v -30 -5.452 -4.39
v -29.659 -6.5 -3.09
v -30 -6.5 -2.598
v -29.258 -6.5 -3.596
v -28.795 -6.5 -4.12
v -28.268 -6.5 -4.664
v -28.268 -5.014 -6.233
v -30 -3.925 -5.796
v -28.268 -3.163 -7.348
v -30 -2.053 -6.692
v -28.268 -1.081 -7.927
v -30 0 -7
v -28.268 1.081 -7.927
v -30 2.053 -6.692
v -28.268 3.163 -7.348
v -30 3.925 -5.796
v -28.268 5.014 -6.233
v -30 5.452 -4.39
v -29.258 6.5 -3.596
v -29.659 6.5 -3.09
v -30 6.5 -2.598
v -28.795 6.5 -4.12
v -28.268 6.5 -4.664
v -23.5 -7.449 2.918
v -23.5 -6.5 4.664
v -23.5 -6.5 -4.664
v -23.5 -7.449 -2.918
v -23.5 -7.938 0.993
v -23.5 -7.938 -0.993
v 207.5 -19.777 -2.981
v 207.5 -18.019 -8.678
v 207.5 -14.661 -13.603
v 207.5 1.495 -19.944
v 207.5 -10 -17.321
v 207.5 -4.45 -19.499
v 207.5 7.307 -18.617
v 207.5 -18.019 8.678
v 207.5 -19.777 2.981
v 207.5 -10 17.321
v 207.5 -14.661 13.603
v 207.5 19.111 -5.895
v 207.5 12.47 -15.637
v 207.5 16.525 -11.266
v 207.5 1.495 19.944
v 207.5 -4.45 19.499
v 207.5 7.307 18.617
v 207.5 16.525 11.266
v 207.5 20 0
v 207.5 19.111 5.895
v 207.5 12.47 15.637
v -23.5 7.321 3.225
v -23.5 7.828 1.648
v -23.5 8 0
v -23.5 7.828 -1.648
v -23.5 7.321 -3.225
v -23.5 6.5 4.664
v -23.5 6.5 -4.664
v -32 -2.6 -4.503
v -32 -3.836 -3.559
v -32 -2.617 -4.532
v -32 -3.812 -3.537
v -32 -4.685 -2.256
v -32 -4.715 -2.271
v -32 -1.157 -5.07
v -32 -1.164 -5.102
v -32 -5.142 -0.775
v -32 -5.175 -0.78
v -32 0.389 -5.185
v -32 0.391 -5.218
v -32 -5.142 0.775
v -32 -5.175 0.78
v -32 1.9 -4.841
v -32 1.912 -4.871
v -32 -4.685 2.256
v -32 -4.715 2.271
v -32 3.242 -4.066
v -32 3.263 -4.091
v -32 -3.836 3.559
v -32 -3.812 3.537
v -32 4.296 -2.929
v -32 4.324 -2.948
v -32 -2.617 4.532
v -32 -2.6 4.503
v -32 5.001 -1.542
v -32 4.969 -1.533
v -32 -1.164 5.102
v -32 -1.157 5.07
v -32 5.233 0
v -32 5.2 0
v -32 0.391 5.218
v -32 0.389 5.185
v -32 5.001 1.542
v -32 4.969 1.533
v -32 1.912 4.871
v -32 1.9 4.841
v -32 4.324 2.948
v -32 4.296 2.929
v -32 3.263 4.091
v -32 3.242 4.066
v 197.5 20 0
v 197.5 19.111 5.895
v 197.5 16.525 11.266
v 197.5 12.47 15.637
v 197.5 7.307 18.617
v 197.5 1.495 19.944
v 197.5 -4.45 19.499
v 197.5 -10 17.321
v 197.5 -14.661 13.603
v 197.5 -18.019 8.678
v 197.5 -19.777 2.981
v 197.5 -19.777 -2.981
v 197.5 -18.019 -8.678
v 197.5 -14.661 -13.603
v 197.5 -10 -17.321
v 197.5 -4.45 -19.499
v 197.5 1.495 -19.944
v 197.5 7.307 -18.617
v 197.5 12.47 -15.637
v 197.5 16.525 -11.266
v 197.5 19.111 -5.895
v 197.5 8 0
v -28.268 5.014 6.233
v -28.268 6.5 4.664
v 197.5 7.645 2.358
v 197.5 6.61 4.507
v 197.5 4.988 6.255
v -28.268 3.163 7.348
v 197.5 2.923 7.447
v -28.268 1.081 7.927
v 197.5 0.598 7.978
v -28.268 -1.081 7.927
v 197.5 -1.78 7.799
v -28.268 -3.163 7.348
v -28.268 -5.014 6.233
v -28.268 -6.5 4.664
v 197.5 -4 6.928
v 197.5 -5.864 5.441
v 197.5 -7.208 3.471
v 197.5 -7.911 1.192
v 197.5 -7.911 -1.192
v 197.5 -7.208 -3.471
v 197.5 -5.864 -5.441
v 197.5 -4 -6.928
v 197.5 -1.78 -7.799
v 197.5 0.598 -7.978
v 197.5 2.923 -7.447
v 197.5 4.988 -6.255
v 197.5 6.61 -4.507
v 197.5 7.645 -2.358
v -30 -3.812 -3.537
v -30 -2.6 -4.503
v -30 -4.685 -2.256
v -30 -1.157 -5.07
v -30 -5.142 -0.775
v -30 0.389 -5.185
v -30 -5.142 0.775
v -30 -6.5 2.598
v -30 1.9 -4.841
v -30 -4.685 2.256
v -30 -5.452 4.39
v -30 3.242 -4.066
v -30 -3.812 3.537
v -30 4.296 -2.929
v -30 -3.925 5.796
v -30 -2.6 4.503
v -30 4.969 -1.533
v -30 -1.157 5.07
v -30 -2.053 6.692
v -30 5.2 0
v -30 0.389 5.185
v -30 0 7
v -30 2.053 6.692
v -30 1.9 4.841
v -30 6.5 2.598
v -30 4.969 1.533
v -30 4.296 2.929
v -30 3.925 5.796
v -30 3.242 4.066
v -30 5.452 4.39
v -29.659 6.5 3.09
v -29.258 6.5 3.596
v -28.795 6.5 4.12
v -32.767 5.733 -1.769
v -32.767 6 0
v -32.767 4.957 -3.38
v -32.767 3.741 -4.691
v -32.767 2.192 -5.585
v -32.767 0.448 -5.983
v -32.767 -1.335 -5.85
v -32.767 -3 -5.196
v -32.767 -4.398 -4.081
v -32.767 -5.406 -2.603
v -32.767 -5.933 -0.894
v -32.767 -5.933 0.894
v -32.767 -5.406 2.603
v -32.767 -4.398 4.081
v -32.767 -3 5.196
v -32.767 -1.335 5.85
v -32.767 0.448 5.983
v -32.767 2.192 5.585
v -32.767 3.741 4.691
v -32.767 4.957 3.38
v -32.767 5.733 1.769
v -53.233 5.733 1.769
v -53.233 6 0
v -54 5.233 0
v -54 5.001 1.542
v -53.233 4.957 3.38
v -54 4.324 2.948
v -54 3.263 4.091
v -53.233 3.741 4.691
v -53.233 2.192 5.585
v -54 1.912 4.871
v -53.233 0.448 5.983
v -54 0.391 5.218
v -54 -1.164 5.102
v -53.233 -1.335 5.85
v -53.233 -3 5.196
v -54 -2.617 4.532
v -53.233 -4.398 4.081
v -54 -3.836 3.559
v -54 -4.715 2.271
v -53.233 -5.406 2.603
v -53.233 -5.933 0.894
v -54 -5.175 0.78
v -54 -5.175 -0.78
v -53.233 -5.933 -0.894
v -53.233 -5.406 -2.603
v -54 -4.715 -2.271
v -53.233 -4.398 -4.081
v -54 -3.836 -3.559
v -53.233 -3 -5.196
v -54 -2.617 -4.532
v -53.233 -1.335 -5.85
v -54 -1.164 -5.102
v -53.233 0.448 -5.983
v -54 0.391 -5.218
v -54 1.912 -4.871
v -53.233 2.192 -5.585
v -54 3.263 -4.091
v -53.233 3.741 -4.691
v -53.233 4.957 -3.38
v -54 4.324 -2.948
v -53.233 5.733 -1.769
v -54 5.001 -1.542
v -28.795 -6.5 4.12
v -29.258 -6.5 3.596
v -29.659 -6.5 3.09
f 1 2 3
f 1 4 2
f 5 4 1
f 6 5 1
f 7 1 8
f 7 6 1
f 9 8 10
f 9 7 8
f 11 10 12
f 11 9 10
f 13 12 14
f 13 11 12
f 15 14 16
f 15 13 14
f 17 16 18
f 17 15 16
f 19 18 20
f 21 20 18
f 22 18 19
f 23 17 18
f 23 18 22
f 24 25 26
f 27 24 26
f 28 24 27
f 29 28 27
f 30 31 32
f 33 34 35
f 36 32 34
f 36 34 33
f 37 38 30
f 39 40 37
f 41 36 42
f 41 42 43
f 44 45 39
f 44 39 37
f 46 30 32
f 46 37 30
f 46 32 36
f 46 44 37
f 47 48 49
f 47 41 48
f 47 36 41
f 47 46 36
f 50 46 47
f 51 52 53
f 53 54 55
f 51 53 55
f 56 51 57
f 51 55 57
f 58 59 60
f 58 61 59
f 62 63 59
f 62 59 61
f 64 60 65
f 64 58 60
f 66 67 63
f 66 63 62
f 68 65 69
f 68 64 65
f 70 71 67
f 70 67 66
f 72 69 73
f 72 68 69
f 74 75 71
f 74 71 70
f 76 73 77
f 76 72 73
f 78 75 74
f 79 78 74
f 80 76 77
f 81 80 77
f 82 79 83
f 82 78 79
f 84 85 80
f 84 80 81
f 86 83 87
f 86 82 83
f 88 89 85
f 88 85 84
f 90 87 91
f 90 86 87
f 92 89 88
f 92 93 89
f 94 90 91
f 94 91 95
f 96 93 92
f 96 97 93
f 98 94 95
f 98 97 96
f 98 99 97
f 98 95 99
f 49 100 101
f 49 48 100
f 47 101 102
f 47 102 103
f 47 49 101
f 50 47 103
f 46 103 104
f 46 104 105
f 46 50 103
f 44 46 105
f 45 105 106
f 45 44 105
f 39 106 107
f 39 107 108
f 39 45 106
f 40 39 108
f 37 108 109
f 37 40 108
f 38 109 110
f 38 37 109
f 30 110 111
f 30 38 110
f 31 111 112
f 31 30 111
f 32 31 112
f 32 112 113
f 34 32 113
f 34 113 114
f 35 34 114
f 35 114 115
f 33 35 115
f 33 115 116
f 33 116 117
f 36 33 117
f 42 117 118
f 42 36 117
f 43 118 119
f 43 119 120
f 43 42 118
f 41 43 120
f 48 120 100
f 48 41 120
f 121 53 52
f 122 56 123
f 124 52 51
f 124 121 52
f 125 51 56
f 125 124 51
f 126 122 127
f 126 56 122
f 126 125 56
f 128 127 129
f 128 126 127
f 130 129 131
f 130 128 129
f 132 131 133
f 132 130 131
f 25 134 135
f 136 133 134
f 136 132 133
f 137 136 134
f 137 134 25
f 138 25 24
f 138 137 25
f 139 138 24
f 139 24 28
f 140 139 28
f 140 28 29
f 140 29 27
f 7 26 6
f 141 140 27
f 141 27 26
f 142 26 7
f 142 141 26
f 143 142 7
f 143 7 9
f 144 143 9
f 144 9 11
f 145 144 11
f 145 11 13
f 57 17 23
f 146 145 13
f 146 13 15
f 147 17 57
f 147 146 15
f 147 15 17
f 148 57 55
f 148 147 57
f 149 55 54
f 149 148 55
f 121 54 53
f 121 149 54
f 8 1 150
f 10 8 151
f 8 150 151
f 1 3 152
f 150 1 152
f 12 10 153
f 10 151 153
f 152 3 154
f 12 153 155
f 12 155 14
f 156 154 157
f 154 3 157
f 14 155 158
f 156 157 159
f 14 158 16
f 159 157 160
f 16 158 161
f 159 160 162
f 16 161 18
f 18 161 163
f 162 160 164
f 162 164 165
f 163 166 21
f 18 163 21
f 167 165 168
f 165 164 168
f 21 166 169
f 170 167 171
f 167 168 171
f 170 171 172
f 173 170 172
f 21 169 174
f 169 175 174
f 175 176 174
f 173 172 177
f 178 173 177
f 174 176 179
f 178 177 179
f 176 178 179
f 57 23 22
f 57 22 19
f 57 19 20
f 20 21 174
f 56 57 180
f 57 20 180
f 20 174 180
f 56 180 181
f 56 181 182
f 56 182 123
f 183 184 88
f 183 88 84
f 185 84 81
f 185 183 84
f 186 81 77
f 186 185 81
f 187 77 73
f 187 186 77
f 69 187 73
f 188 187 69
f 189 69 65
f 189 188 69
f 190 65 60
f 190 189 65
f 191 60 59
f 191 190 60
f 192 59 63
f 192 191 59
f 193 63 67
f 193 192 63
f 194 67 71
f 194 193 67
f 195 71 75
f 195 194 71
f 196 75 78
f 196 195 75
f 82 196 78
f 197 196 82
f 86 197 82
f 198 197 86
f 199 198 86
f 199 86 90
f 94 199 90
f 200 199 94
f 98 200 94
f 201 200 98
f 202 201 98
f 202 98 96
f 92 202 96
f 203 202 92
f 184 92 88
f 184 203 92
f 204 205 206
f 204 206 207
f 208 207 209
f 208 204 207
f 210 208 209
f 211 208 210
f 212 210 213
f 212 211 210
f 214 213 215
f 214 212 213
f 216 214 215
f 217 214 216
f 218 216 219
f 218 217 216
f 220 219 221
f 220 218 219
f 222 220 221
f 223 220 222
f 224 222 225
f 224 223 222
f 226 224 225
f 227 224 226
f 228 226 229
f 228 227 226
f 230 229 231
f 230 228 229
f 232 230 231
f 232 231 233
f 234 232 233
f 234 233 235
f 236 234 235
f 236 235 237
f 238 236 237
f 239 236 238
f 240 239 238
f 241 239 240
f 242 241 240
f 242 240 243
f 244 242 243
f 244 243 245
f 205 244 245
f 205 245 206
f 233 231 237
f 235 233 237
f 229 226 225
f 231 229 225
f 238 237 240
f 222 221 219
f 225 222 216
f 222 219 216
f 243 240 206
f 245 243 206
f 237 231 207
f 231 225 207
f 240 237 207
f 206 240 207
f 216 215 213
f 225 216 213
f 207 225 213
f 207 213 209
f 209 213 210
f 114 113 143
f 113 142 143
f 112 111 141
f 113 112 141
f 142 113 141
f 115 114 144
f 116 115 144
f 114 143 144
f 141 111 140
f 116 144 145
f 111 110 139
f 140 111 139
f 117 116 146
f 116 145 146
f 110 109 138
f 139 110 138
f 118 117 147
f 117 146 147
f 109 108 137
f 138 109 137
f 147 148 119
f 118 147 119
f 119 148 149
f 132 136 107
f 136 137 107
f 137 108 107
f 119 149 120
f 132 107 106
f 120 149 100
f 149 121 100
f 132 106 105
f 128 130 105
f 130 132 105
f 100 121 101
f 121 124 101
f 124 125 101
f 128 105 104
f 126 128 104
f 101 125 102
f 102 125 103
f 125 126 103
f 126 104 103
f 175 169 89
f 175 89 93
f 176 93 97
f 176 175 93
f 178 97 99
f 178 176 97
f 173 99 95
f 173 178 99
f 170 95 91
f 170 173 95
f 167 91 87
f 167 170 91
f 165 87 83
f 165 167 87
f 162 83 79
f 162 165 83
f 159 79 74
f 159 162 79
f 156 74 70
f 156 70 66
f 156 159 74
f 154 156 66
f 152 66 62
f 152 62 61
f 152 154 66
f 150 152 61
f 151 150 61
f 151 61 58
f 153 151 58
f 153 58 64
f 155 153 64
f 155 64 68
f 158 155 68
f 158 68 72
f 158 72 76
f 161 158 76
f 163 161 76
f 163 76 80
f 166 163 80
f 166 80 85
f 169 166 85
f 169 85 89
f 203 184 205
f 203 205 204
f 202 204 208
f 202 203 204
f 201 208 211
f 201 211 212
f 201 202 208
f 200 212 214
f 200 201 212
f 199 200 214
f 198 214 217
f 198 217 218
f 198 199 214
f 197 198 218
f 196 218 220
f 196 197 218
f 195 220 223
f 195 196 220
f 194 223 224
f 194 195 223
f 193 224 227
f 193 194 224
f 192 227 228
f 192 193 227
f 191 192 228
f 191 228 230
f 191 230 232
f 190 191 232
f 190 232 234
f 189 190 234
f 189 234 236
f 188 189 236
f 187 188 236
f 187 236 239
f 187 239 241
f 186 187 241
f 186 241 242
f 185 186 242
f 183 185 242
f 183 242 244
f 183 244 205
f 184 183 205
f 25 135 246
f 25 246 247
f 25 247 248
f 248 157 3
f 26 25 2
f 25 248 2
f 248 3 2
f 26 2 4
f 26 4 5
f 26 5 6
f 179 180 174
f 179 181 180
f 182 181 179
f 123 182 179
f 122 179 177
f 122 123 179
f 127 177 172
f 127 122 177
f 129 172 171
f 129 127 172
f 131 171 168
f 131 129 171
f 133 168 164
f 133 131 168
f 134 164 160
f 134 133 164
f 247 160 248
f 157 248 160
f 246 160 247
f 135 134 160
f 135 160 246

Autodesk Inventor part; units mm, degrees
sketch "Sketch_9" plane through (0, 0, 0) normal (0, 0, 1) x (1, 0, 0)
  line L0 (207.5, 0) -> (-54, 0)
  line L1 (-54, 0) -> (-54, 5.233)
  line L2 (-54, 5.233) -> (-53.233, 6)
  line L3 (-53.233, 6) -> (-32.767, 6)
  line L4 (-32.767, 6) -> (-32, 5.233)
  line L5 (-32, 5.233) -> (-32, 5.2)
  line L6 (-32, 5.2) -> (-30, 5.2)
  line L7 (-30, 5.2) -> (-30, 7)
  line L8 (-30, 7) -> (-28.2679, 8)
  line L9 (-28.2679, 8) -> (197.5, 8)
  line L10 (197.5, 8) -> (197.5, 20)
  line L11 (197.5, 20) -> (207.5, 20)
  line L12 (207.5, 20) -> (207.5, 0)
  line L13 (207.5, 0) -> (-54, 0)
revolve "Revolution1" add sketch "Sketch_9" angle 360 about axis through (207.5, 0, 0) along (1, 0, 0)
thread "Thread1" size "M12x1.25" class "6g" standard "ISO Metric profile" full length
sketch "Sketch_4" plane through (-30, 0, 0) normal (1, 0, 0) x (0, 0, -1)
  line L0 (-15, -11.5) -> (15, -11.5)
  line L1 (15, -11.5) -> (15, 11.5)
  line L2 (15, 11.5) -> (-15, 11.5)
  line L3 (-15, 11.5) -> (-15, -11.5)
  line L4 (-10, 6.5) -> (-10, -6.5)
  line L5 (-10, -6.5) -> (10, -6.5)
  line L6 (10, -6.5) -> (10, 6.5)
  line L7 (10, 6.5) -> (-10, 6.5)
extrude "Extrusion1" cut sketch "Sketch_4" along normal blind 6.5
ref_plane "A4_XY" through (455, 0, 0) normal (0, 1, 0) x (1, 0, 0)
ref_plane "A4_YZ" through (455, 0, 0) normal (1, 0, 0) x (0, 0, -1)
ref_plane "A4_ZX" through (455, 0, 0) normal (0, 0, -1) x (0, 1, 0)
ref_plane "ROD_BODY_XY" through (0, 0, 0) normal (1, 0, 0) x (0, 0, -1)
ref_plane "ROD_BODY_YZ" through (0, 0, 0) normal (0, 0, -1) x (0, 1, 0)
ref_plane "ROD_BODY_ZX" through (0, 0, 0) normal (0, 1, 0) x (1, 0, 0)
ref_plane "ROD_NUT_XY" through (-54, 0, 0) normal (-1, 0, 0) x (0, 0, -1)
ref_plane "ROD_NUT_YZ" through (-54, 0, 0) normal (0, 0, -1) x (0, -1, 0)
ref_plane "ROD_NUT_ZX" through (-54, 0, 0) normal (0, -1, 0) x (-1, 0, 0)
properties part number "CP96S40-160_ROD" material "Stainless Steel, Polished"
